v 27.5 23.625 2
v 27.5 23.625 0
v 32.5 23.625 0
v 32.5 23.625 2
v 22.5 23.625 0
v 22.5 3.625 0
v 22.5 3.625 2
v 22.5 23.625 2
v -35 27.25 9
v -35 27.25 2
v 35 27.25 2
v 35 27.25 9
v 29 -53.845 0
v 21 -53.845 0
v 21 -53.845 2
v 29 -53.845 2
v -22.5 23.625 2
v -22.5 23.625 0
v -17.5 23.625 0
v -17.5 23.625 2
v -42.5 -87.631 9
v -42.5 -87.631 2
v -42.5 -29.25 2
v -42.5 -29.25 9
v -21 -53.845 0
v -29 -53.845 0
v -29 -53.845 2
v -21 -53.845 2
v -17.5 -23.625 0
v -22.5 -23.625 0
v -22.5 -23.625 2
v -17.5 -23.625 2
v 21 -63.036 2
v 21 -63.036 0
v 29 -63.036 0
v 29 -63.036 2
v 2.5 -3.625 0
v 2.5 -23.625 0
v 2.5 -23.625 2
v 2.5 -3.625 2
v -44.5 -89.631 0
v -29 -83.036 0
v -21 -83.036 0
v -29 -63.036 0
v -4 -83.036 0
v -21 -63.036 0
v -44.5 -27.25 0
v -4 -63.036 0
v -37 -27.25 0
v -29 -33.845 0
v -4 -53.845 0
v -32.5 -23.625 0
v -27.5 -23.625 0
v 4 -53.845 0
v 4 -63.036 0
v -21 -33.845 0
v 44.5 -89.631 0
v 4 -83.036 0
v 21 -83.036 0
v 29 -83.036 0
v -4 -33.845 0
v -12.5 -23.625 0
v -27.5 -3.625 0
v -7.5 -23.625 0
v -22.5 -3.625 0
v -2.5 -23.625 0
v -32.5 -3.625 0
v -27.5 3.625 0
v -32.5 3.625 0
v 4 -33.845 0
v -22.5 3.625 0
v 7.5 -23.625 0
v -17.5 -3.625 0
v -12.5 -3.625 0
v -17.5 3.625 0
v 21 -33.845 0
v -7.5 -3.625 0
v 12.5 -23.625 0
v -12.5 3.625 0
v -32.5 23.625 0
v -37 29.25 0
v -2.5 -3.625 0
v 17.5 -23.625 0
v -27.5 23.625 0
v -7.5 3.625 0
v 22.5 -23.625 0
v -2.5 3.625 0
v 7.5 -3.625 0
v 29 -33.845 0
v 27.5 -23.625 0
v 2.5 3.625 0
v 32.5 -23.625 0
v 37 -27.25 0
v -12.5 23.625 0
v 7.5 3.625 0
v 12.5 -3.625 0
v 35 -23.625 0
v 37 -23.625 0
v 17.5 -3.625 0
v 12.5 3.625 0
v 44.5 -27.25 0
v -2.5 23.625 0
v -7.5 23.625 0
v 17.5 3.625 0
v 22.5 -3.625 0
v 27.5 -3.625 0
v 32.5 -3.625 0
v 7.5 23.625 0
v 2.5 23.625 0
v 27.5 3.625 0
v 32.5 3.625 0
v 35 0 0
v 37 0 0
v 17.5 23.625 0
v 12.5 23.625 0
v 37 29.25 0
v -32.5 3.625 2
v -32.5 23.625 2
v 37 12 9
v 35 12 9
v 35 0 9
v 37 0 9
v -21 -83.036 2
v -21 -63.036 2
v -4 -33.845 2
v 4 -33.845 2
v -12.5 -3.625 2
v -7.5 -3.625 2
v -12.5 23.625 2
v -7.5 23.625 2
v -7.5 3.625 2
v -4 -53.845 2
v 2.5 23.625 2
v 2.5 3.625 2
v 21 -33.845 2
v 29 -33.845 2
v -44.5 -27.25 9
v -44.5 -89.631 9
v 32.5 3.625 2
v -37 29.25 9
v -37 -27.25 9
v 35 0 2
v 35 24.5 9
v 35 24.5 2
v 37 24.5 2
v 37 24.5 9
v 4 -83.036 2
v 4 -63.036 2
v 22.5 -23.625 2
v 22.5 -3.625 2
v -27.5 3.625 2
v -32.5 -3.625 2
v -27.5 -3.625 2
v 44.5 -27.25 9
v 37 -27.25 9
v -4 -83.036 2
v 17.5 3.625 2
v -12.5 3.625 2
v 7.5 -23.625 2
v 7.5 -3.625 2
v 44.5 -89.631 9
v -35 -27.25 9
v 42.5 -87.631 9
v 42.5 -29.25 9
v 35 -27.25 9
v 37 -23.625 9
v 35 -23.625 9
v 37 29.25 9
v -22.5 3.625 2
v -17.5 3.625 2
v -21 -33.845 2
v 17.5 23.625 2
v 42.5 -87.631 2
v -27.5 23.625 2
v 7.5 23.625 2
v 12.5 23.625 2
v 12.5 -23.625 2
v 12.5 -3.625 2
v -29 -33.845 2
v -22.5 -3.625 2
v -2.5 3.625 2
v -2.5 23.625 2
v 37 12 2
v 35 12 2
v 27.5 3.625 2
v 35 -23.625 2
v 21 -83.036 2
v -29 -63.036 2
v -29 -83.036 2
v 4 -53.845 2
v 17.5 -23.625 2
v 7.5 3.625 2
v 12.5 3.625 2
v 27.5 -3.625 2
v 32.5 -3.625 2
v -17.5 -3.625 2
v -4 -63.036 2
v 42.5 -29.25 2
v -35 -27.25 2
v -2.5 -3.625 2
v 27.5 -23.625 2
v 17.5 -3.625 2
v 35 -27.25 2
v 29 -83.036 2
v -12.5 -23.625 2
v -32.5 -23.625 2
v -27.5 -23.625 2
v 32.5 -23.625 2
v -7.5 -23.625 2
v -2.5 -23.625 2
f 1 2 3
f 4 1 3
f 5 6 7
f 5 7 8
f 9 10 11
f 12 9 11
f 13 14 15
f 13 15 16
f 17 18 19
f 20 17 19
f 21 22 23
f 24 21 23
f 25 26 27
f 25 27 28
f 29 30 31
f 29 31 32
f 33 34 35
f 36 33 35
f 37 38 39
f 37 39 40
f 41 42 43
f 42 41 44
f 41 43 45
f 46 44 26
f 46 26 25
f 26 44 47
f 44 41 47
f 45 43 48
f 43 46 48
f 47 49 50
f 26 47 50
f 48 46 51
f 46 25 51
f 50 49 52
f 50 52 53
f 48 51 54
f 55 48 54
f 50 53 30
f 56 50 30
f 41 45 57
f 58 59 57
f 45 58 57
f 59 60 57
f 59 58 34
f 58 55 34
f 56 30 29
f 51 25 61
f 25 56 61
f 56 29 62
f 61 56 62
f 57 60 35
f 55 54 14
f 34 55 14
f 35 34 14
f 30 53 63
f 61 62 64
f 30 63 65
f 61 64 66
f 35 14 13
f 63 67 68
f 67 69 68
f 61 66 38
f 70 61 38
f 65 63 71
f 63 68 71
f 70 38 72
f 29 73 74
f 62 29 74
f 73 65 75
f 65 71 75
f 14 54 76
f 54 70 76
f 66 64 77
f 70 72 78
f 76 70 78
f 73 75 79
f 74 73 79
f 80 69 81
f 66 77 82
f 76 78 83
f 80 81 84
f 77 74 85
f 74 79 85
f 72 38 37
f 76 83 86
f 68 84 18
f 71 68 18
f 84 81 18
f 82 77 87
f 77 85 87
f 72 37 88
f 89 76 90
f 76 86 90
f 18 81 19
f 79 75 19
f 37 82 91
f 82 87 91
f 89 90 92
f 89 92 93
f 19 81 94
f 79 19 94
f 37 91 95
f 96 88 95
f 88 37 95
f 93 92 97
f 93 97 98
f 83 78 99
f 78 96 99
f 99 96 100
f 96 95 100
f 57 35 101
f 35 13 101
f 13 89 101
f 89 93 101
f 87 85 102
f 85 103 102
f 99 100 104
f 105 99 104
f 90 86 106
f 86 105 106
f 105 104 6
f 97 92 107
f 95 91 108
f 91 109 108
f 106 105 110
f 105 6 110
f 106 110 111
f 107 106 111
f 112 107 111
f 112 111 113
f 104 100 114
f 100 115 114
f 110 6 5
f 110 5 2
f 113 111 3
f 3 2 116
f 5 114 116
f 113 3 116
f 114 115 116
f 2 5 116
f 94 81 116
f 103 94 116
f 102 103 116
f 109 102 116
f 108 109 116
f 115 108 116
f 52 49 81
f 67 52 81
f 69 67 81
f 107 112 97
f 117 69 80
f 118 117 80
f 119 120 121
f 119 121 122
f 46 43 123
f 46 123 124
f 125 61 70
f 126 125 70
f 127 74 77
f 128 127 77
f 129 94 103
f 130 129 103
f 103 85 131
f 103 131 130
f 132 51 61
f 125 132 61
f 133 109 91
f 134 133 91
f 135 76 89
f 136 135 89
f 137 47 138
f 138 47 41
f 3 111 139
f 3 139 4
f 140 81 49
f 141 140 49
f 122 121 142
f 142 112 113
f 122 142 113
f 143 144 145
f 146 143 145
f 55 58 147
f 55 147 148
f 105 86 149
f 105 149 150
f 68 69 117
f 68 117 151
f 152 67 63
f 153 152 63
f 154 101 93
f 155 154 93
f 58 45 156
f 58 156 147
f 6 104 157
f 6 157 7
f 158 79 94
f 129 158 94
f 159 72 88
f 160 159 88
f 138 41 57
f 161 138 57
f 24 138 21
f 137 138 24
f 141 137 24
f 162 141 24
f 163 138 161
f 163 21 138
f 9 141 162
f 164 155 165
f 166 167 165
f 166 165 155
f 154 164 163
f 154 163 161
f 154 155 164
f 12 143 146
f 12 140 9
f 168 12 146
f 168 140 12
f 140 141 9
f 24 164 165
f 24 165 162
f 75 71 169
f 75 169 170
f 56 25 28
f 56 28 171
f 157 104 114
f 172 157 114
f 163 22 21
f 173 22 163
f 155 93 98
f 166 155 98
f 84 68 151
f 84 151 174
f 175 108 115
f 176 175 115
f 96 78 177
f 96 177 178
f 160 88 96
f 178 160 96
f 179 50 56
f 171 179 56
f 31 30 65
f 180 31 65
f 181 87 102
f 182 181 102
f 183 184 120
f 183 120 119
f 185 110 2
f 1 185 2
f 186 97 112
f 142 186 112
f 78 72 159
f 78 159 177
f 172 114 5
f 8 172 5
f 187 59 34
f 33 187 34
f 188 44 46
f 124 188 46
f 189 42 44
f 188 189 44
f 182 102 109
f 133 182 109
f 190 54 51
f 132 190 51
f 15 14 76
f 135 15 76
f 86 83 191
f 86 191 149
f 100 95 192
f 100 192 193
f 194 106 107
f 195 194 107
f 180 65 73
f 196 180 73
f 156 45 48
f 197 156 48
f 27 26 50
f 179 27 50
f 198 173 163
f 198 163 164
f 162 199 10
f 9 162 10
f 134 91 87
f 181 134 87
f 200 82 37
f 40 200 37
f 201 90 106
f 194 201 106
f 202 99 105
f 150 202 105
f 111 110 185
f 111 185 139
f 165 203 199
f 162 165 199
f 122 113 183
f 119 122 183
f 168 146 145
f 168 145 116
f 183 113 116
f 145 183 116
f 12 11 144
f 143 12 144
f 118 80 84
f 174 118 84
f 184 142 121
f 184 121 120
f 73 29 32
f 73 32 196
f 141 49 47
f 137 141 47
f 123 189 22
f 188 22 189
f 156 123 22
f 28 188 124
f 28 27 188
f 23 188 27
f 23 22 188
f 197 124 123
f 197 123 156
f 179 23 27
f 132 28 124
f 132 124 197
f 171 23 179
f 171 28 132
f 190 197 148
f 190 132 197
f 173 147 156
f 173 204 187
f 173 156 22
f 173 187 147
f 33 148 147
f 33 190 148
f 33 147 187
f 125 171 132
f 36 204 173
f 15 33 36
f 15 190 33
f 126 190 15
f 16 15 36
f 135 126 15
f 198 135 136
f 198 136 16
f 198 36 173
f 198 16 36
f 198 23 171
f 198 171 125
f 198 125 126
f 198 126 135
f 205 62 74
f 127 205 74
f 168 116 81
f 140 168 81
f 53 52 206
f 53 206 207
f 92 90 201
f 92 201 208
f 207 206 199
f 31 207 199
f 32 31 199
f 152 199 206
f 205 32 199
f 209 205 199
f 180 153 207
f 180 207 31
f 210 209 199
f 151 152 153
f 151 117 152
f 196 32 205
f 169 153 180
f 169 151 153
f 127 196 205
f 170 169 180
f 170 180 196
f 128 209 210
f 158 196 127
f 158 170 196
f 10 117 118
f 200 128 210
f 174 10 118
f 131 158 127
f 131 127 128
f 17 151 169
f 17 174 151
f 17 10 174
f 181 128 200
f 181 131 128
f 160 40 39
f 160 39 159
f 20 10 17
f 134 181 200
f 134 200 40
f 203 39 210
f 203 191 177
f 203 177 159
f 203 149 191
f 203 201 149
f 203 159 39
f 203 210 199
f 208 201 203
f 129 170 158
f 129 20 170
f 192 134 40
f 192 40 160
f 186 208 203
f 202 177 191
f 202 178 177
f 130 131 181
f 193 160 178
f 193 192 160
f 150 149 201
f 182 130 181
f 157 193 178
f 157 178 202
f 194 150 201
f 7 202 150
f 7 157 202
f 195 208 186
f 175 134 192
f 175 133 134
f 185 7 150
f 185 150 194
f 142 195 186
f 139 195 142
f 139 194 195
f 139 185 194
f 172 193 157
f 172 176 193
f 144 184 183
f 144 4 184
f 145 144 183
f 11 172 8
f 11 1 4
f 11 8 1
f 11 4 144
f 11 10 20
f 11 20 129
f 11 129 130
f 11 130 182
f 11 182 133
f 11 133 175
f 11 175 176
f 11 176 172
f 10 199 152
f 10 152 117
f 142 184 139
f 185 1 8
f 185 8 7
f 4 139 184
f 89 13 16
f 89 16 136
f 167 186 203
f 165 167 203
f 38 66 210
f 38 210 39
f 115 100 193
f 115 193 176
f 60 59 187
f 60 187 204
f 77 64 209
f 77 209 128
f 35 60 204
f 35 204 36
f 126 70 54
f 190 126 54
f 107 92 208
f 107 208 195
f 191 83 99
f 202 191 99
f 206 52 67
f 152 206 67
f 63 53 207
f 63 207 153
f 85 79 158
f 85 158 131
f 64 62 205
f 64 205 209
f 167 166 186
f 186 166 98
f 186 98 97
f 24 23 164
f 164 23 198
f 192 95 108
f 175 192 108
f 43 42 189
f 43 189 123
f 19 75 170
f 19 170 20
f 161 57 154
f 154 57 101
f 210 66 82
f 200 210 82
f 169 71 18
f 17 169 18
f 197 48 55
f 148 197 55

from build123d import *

# Parameters (mm, degrees)
SKETCH1_W             = 5
SKETCH1_H             = 20
BOSS_EXTRUDE1_DEPTH   = 2
SKETCH1_W_2           = 8
BOSS_EXTRUDE1_2_DEPTH = 2
SKETCH1_3_W           = 85
SKETCH1_3_H           = 58.381043258
SKETCH1_3_W_2         = 2
SKETCH1_3_H_2         = 12
BOSS_EXTRUDE2_DEPTH   = 9


with BuildPart() as part:
    # Sketch1 → Boss-Extrude1 (new body)
    with BuildSketch(Plane.XY):
        Polygon((37, 12), (37, 24.5), (35, 24.5), (35, 27.25), (0, 27.25), (-35, 27.25), (-35, -27.25), (35, -27.25), (35, 12), align=None)
        with Locations((-30, -13.625)):
            Rectangle(SKETCH1_W, SKETCH1_H, mode=Mode.SUBTRACT)
        with Locations((-20, -13.625)):
            Rectangle(SKETCH1_W, SKETCH1_H, mode=Mode.SUBTRACT)
        with Locations((-10, -13.625)):
            Rectangle(SKETCH1_W, SKETCH1_H, mode=Mode.SUBTRACT)
        with Locations((0, -13.625)):
            Rectangle(SKETCH1_W, SKETCH1_H, mode=Mode.SUBTRACT)
        with Locations((10, -13.625)):
            Rectangle(SKETCH1_W, SKETCH1_H, mode=Mode.SUBTRACT)
        with Locations((20, -13.625)):
            Rectangle(SKETCH1_W, SKETCH1_H, mode=Mode.SUBTRACT)
        with Locations((30, -13.625)):
            Rectangle(SKETCH1_W, SKETCH1_H, mode=Mode.SUBTRACT)
        with Locations((-30, 13.625)):
            Rectangle(SKETCH1_W, SKETCH1_H, mode=Mode.SUBTRACT)
        with Locations((-20, 13.625)):
            Rectangle(SKETCH1_W, SKETCH1_H, mode=Mode.SUBTRACT)
        with Locations((-10, 13.625)):
            Rectangle(SKETCH1_W, SKETCH1_H, mode=Mode.SUBTRACT)
        Polygon((-2.5, 23.625), (0, 23.625), (2.5, 23.625), (2.5, 3.625), (0, 3.625), (-2.5, 3.625), align=None, mode=Mode.SUBTRACT)
        with Locations((10, 13.625)):
            Rectangle(SKETCH1_W, SKETCH1_H, mode=Mode.SUBTRACT)
        with Locations((20, 13.625)):
            Rectangle(SKETCH1_W, SKETCH1_H, mode=Mode.SUBTRACT)
        with Locations((30, 13.625)):
            Rectangle(SKETCH1_W, SKETCH1_H, mode=Mode.SUBTRACT)
    extrude(amount=BOSS_EXTRUDE1_DEPTH)



with BuildPart() as body_2:
    # Sketch1 → Boss-Extrude1 2 (new body)
    with BuildSketch(Plane.XY):
        Polygon((0, -29.25), (-42.5, -29.25), (-42.5, -87.631043258), (42.5, -87.631043258), (42.5, -29.25), align=None)
        with Locations((-25, -73.035782443)):
            Rectangle(SKETCH1_W_2, SKETCH1_H, mode=Mode.SUBTRACT)
        with Locations((0, -73.035782443)):
            Rectangle(SKETCH1_W_2, SKETCH1_H, mode=Mode.SUBTRACT)
        with Locations((-25, -43.845260814)):
            Rectangle(SKETCH1_W_2, SKETCH1_H, mode=Mode.SUBTRACT)
        Polygon((-4, -33.845260814), (0, -33.845260814), (4, -33.845260814), (4, -53.845260814), (0, -53.845260814), (-4, -53.845260814), align=None, mode=Mode.SUBTRACT)
        with Locations((25, -73.035782443)):
            Rectangle(SKETCH1_W_2, SKETCH1_H, mode=Mode.SUBTRACT)
        with Locations((25, -43.845260814)):
            Rectangle(SKETCH1_W_2, SKETCH1_H, mode=Mode.SUBTRACT)
    extrude(amount=BOSS_EXTRUDE1_2_DEPTH)


with BuildPart() as part_1:
    add(part.part)

    add(body_2.part)  # Boss-Extrude2 merges body 2
    # Sketch1<3> → Boss-Extrude2 (add)
    # profile 1 of 2: a face of its own
    with BuildSketch(Plane.XY):
        Polygon((37, 29.25), (-37, 29.25), (-37, -27.25), (-44.5, -27.25), (-44.5, -89.631043258), (44.5, -89.631043258), (44.5, -27.25), (37, -27.25), (37, -23.625), (35, -23.625), (35, -27.25), (-35, -27.25), (-35, 27.25), (35, 27.25), (35, 24.5), (37, 24.5), align=None)
        with Locations((0, -58.440521629)):
            Rectangle(SKETCH1_3_W, SKETCH1_3_H, mode=Mode.SUBTRACT)
    # profile 2 of 2: a face of its own
    with BuildSketch(Plane.XY):
        with Locations((36, 6)):
            Rectangle(SKETCH1_3_W_2, SKETCH1_3_H_2)
    extrude(amount=BOSS_EXTRUDE2_DEPTH)


solid = part_1.part
